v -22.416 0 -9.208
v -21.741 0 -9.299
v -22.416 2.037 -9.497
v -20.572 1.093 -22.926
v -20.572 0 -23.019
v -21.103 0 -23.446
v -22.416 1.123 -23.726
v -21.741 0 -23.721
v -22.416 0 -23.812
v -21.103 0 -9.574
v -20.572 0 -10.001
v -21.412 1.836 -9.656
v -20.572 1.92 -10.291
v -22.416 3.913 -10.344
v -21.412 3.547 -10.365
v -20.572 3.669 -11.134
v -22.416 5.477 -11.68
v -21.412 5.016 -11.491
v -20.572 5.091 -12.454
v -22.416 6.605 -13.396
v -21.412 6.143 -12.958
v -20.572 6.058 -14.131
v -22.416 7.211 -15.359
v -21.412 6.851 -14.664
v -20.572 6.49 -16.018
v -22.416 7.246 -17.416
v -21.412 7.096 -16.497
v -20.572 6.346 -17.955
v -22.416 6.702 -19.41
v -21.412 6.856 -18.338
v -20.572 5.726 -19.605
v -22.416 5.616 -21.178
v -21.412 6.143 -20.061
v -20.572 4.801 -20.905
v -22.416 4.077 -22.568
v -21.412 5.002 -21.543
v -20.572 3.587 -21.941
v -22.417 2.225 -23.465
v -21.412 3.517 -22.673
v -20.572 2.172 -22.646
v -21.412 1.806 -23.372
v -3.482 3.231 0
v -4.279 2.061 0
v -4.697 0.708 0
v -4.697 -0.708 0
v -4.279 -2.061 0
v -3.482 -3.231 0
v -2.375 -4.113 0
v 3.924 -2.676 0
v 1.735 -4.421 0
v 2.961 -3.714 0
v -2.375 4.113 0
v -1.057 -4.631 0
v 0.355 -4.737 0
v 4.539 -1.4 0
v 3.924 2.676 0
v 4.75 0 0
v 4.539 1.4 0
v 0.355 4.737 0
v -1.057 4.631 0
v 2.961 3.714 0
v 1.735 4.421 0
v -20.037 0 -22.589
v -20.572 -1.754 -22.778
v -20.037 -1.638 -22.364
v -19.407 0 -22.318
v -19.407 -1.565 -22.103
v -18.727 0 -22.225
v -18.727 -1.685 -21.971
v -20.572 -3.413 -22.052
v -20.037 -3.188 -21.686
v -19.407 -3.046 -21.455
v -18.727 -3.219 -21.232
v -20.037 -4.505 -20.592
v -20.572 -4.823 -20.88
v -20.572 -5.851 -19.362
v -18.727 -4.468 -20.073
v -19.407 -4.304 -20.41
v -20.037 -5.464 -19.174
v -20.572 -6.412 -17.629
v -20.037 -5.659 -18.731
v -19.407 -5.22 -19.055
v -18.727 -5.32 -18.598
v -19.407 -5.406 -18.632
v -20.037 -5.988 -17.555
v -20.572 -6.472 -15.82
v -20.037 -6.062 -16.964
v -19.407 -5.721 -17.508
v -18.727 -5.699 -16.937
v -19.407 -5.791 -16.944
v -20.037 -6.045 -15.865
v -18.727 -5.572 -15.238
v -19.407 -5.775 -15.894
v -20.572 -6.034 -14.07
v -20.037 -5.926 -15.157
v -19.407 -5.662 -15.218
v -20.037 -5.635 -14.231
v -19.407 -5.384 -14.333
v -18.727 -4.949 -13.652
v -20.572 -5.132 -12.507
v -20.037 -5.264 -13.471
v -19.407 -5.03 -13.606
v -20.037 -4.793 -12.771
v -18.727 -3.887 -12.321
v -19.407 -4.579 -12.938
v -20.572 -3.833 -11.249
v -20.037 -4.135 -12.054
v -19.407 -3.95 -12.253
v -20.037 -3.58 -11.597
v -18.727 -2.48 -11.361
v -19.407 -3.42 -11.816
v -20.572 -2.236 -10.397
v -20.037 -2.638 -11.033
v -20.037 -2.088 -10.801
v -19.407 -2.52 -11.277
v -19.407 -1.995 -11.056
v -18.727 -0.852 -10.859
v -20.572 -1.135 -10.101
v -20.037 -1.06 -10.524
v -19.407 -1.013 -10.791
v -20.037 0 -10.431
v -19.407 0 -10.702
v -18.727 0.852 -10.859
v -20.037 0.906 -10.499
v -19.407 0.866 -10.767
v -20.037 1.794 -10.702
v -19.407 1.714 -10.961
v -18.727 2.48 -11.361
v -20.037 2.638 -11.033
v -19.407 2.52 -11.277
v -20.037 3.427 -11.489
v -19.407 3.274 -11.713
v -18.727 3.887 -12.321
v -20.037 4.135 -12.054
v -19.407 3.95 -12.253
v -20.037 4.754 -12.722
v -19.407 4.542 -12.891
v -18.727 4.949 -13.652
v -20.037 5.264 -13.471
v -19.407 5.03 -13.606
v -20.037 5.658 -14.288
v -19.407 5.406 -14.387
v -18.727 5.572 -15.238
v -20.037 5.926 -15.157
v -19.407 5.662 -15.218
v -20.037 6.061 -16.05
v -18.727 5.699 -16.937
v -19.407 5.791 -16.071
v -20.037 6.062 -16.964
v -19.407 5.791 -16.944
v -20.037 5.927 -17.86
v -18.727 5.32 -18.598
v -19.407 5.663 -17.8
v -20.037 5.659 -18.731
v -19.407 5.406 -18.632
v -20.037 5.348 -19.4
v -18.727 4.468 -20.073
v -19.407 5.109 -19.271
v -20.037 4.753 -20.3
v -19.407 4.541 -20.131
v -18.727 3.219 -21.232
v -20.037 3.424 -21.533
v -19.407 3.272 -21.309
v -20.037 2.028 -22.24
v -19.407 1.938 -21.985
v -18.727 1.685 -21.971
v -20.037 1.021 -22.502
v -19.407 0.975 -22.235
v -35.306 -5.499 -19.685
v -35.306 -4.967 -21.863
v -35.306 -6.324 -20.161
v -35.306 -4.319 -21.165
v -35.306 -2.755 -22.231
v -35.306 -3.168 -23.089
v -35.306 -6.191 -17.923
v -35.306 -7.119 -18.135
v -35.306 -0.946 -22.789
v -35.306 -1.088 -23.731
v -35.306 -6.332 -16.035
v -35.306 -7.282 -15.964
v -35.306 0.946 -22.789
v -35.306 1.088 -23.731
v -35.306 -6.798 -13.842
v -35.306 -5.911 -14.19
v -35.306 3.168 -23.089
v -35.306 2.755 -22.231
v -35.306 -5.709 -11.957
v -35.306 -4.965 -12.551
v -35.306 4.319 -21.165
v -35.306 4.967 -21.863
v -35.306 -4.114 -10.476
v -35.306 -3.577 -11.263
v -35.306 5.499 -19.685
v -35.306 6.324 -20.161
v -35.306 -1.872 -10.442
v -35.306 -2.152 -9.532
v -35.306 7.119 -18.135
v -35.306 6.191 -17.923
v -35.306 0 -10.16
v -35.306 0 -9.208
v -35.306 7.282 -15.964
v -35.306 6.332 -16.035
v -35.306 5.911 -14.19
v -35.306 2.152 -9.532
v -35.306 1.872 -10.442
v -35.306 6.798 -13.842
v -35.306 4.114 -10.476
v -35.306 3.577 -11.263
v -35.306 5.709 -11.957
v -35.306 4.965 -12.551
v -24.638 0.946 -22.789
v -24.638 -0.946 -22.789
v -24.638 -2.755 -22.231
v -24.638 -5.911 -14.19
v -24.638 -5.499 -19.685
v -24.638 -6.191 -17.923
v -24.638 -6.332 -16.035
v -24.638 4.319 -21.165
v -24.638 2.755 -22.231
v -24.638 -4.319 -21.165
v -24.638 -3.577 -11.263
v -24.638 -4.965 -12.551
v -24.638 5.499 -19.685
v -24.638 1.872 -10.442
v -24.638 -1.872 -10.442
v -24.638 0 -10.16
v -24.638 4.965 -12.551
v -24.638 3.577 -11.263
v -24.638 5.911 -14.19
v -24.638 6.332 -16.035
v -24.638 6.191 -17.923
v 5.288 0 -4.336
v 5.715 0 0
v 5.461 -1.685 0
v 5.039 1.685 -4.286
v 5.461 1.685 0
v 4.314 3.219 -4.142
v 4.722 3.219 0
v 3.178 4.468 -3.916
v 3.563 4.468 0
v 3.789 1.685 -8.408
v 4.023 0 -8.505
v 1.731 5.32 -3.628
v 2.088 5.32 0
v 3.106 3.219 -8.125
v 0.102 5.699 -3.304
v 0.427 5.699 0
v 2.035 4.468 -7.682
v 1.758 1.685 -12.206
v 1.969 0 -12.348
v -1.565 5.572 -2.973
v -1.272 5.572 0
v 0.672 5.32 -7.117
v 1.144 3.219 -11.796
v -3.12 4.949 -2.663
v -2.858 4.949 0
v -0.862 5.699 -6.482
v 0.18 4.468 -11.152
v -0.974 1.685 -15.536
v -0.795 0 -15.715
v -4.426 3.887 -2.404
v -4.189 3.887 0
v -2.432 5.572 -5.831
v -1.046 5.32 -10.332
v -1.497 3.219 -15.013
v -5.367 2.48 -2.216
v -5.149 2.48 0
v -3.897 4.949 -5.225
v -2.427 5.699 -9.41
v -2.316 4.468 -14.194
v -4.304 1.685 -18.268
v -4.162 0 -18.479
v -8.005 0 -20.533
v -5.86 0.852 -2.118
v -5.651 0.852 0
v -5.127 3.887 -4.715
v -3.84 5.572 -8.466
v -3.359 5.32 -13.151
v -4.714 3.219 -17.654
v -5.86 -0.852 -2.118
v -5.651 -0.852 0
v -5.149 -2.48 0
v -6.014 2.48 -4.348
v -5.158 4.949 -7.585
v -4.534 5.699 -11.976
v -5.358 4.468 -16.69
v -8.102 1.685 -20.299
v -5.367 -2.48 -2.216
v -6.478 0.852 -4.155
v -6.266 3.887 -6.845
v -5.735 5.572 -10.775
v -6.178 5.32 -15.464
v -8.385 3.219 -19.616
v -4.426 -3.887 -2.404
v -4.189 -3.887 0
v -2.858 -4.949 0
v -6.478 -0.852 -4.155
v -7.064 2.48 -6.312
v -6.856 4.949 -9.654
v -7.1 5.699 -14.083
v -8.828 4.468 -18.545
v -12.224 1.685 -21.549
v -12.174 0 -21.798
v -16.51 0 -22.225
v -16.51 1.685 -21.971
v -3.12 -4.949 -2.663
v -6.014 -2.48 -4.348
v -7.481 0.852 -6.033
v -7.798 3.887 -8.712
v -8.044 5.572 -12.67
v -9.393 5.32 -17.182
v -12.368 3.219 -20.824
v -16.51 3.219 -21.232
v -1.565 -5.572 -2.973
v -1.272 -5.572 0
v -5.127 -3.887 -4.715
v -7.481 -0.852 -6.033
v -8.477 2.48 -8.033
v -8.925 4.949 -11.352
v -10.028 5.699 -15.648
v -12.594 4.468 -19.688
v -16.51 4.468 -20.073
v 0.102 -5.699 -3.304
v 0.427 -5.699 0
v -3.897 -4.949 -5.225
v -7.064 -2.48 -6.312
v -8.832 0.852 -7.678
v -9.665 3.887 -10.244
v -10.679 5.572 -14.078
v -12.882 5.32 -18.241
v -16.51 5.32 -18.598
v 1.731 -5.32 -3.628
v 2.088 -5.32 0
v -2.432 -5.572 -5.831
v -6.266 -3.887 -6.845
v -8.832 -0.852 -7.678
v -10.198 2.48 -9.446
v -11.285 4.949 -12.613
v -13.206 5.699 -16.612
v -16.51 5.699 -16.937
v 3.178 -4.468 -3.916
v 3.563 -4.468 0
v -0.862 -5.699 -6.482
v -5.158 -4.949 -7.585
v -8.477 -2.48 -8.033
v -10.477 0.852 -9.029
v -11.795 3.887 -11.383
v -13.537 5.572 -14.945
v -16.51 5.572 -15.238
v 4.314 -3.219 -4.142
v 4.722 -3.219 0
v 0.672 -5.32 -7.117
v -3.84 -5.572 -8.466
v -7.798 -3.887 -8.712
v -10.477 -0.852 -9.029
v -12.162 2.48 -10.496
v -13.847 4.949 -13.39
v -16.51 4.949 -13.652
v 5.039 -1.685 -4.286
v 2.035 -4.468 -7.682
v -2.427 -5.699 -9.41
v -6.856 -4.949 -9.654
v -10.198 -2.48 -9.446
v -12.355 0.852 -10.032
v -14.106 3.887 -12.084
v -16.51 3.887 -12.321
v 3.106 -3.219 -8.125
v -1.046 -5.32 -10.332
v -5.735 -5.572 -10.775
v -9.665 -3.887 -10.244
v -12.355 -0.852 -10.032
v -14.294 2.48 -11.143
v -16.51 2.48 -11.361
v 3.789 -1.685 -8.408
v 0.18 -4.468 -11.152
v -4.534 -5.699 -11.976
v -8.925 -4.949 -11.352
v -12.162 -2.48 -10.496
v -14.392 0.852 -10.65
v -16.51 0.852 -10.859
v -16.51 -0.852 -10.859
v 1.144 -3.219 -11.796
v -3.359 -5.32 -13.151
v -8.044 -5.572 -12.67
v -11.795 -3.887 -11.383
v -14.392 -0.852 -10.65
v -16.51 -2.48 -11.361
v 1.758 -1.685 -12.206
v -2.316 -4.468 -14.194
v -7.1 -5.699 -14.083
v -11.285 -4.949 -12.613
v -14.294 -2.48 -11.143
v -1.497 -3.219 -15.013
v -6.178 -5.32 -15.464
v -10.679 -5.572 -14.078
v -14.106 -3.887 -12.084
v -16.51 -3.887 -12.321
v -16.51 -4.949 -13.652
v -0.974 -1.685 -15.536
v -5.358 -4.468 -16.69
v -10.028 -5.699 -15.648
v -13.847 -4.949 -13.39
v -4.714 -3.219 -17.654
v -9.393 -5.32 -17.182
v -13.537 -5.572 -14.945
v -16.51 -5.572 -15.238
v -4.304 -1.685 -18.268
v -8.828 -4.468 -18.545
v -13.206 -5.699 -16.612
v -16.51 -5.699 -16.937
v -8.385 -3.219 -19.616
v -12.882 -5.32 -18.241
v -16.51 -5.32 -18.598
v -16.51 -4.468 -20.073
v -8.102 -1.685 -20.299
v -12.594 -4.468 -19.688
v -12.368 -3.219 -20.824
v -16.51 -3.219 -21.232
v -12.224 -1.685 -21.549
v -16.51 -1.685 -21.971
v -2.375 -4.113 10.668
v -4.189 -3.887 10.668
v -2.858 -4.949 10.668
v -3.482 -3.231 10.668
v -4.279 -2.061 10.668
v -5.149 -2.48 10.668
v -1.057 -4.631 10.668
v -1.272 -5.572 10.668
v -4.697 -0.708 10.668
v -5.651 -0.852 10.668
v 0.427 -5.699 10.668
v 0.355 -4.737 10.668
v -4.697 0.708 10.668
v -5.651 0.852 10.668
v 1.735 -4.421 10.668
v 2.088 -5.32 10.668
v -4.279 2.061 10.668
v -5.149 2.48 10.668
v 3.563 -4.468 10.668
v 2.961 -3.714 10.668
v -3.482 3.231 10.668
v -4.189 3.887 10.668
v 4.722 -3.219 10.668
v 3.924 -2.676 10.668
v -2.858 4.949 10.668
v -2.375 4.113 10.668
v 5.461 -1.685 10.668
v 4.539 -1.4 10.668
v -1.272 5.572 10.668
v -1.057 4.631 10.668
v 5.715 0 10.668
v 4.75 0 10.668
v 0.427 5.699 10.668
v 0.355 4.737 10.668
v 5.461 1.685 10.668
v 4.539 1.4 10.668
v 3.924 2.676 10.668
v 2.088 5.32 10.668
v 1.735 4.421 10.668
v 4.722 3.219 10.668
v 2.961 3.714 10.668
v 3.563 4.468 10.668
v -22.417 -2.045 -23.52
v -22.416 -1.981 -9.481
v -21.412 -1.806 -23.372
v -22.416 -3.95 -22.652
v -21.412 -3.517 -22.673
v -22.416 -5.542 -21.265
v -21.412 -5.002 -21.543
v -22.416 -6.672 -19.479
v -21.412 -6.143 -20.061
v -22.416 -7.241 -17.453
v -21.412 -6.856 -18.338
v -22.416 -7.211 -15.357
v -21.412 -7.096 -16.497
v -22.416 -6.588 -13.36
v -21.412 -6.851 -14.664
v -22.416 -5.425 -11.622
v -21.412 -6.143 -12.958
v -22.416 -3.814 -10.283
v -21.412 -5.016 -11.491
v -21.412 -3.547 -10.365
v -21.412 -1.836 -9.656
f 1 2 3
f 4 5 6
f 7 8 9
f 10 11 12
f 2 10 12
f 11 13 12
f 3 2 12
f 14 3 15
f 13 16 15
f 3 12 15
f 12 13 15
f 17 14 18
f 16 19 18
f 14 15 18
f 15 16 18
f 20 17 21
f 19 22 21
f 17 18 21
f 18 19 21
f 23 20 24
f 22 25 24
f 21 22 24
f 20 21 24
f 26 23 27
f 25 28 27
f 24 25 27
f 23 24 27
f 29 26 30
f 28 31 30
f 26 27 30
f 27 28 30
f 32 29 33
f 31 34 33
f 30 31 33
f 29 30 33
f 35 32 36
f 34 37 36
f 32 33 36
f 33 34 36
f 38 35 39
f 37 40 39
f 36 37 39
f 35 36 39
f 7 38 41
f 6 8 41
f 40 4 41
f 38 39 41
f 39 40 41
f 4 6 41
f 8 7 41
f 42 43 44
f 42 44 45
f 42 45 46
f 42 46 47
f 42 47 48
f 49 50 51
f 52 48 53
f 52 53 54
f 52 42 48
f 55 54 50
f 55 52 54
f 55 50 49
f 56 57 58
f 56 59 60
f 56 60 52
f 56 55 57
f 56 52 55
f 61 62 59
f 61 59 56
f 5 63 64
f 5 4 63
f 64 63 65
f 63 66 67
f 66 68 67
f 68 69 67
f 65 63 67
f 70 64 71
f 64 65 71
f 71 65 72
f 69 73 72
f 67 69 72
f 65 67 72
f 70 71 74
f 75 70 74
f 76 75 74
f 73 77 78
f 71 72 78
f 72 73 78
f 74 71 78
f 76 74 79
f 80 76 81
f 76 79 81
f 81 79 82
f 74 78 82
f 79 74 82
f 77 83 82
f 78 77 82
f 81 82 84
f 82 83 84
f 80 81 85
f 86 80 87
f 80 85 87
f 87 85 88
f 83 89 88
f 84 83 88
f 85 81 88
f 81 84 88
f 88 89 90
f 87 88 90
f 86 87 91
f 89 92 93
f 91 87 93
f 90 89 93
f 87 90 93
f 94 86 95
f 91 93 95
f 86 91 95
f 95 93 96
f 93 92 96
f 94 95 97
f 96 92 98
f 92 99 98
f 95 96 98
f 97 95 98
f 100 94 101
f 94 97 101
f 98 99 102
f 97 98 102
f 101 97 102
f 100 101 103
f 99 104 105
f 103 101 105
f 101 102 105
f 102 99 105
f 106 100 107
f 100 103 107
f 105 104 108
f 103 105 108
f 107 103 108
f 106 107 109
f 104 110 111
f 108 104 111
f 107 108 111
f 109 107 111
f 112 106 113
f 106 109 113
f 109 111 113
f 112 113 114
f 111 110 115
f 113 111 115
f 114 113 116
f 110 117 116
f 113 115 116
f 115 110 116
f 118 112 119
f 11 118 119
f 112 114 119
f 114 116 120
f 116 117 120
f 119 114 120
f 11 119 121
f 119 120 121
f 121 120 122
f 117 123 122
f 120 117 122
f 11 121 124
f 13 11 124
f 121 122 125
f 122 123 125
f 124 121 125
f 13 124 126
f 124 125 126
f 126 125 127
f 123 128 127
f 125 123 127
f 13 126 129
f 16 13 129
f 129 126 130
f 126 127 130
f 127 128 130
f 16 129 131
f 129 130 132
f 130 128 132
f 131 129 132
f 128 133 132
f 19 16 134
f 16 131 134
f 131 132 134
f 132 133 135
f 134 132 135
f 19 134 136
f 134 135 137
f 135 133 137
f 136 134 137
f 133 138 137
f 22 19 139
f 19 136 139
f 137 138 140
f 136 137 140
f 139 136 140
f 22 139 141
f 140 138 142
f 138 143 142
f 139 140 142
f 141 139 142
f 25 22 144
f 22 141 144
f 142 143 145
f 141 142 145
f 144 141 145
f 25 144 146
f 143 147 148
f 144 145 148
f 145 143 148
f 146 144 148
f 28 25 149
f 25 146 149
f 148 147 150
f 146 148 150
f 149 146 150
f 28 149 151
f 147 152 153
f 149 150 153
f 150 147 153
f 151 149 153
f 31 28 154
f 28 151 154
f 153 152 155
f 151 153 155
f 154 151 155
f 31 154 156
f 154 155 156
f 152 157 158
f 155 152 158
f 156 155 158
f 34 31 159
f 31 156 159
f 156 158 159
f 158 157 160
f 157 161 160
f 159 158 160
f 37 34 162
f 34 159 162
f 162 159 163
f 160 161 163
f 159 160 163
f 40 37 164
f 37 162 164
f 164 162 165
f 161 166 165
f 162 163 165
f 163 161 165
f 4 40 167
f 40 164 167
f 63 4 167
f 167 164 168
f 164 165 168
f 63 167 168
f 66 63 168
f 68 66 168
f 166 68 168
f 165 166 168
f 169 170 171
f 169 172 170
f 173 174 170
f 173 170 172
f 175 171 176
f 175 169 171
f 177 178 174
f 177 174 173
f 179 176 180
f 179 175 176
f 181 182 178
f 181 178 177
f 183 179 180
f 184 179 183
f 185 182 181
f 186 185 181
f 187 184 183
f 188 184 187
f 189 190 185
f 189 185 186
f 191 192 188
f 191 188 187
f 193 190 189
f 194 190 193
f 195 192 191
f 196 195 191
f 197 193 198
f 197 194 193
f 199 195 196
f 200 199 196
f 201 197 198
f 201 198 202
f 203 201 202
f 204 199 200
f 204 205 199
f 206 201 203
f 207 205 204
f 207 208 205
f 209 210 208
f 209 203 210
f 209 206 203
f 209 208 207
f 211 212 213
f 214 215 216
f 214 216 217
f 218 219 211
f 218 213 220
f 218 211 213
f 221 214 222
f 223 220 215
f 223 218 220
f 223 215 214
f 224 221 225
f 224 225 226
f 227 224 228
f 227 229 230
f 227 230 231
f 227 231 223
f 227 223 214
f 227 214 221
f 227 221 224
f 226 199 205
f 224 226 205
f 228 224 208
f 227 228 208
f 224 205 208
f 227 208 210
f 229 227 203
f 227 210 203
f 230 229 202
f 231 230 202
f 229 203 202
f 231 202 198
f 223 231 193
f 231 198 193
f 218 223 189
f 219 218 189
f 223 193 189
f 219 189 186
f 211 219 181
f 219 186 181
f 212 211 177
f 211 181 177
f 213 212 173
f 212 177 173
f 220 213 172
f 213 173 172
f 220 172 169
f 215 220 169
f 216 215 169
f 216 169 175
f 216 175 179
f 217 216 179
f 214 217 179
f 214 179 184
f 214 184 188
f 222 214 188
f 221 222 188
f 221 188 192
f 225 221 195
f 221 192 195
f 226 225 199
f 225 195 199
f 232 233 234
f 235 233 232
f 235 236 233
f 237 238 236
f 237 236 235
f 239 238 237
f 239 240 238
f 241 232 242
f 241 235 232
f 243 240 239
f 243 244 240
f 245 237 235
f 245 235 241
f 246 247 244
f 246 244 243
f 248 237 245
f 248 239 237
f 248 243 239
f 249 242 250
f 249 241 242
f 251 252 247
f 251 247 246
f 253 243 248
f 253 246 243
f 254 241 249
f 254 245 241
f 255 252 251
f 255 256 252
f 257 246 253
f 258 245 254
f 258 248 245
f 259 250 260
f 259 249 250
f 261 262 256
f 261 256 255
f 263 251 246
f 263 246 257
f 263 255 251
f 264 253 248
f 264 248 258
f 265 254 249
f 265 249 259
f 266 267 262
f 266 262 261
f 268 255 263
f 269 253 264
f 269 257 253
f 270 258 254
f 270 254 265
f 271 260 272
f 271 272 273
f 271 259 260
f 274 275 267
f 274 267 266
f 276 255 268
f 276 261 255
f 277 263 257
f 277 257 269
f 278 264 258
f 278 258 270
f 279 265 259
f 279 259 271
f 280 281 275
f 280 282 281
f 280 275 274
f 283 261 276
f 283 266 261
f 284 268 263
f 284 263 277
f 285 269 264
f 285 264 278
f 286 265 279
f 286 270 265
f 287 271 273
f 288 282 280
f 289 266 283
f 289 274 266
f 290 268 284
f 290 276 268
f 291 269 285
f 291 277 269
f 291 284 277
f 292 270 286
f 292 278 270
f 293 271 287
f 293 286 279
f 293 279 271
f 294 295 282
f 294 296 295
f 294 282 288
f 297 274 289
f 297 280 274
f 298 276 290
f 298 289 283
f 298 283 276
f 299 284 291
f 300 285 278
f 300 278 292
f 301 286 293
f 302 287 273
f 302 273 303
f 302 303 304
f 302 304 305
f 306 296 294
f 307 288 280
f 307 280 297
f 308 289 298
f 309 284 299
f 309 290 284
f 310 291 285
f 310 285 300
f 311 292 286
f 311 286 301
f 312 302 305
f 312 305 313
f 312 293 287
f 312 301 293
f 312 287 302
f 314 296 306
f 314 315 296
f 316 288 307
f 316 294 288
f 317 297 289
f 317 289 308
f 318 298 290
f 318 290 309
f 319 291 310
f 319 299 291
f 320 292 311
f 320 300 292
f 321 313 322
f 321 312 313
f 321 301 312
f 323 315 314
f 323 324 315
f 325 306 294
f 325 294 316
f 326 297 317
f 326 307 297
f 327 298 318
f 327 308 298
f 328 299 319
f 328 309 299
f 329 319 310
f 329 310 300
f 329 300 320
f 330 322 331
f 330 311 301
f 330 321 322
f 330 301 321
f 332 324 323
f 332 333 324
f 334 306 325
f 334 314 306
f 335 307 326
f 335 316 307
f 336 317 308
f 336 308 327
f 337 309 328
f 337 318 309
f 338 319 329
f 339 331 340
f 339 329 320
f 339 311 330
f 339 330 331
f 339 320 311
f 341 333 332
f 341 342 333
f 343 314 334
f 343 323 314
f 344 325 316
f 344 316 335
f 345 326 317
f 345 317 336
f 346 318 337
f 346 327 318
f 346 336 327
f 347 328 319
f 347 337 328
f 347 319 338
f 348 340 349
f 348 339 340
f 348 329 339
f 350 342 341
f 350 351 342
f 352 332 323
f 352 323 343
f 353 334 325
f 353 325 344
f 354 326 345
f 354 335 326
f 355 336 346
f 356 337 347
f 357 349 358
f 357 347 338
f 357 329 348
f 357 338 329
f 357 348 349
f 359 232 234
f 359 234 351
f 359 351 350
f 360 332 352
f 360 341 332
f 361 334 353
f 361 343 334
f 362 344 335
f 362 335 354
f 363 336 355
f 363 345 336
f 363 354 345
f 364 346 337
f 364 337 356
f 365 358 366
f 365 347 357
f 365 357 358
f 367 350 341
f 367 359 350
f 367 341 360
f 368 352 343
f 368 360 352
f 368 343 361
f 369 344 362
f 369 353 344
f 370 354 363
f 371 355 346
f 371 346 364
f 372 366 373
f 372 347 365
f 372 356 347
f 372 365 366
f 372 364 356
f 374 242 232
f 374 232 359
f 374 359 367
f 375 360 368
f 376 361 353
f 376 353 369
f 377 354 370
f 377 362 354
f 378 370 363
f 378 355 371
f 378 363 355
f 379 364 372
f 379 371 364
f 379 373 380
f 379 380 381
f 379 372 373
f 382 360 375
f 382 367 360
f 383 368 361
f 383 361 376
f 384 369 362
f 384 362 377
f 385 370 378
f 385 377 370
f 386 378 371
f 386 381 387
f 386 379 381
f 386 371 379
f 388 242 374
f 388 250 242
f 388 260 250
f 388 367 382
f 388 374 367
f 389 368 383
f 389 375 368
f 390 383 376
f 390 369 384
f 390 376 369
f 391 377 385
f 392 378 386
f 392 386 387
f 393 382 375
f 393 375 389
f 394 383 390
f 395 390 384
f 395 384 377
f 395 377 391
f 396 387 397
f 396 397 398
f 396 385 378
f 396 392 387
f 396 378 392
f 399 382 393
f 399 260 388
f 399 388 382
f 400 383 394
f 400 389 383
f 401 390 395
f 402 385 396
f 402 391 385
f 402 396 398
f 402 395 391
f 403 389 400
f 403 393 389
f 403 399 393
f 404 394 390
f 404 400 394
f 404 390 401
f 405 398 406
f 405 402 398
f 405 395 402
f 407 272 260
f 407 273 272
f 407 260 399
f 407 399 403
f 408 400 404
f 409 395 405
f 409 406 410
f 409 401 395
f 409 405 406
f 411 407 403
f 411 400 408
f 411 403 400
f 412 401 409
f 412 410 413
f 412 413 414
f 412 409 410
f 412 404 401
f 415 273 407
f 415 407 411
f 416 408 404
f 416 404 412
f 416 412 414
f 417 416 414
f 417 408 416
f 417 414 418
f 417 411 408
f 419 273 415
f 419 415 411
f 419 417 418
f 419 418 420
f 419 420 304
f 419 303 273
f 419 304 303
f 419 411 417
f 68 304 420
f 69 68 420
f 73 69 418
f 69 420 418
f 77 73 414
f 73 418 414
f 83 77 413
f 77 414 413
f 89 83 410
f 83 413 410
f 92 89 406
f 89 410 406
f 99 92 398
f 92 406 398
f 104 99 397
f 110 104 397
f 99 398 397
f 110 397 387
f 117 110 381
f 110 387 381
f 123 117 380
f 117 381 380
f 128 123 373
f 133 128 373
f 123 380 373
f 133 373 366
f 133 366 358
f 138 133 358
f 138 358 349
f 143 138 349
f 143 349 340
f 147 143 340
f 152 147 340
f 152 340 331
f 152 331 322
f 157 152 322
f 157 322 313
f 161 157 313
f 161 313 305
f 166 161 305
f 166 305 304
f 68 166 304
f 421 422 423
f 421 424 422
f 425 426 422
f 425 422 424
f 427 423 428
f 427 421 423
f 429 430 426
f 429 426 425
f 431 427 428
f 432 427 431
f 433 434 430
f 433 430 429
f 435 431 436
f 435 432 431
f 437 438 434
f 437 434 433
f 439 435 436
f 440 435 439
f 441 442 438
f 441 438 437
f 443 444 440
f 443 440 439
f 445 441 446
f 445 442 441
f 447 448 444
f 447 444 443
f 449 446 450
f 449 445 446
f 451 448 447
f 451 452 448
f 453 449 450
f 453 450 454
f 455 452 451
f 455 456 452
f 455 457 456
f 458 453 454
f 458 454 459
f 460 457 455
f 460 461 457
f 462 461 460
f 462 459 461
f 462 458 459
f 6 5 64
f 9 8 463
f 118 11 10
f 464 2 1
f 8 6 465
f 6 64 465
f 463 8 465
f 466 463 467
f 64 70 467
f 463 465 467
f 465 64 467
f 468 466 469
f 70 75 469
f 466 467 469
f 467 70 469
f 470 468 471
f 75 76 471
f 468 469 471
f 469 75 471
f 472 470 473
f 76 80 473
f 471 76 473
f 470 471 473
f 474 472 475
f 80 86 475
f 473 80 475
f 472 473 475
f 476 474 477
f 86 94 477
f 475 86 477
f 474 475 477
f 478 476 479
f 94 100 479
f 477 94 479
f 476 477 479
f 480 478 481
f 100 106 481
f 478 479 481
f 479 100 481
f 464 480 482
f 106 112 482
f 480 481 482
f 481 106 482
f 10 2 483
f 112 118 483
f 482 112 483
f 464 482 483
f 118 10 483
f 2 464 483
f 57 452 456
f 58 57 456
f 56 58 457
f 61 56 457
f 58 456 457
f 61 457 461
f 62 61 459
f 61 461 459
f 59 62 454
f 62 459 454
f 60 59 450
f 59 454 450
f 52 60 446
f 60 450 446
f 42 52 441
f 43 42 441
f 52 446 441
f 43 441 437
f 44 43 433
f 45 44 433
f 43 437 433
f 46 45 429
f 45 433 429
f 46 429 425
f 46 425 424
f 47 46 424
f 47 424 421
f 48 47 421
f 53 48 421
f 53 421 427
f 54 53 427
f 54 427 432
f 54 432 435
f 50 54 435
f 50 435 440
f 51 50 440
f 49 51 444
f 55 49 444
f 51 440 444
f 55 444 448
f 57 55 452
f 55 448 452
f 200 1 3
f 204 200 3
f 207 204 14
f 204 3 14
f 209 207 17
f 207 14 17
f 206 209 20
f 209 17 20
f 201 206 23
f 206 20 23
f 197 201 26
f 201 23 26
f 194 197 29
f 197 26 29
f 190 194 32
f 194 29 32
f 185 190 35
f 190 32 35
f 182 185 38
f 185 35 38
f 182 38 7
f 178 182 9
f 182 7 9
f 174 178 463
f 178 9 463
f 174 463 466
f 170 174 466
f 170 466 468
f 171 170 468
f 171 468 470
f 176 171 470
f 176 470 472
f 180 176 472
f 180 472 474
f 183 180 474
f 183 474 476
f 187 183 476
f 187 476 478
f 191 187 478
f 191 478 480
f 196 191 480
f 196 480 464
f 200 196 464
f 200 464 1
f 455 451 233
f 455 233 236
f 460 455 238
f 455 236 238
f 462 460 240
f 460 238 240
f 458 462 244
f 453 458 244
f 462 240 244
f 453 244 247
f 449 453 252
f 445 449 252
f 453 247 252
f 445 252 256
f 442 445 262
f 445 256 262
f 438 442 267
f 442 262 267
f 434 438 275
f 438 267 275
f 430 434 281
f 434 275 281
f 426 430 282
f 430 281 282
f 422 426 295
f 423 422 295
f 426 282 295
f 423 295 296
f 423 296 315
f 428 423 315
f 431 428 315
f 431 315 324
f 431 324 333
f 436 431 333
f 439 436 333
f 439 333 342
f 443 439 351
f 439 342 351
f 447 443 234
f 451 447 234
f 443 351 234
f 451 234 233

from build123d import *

# Parameters (mm, degrees)
SKETCH3_R           = 5.715
BOSS_EXTRUDE1_DEPTH = 10.668
SWEEP1_OUTLINE_R    = 5.715
SWEEP1_ANGLE        = 90
SKETCH9_R           = 5.715
BOSS_EXTRUDE2_DEPTH = 4.572
SKETCH11_R          = 7.3025
BOSS_EXTRUDE3_DEPTH = 14.224
FILLET1_R           = 2.54
FILLET2_R           = 2.54
SKETCH12_R          = 4.7498
CUT_EXTRUDE1_DEPTH  = 10.668
SKETCH13_R          = 6.35
CUT_EXTRUDE2_DEPTH  = 10.668


# Read off the part's stored shape, not the designer's step: Sweep1
with BuildPart() as part:
    # Sketch3 → Boss-Extrude1 (new body)
    with BuildSketch(Plane.XY):
        Circle(SKETCH3_R)
    extrude(amount=BOSS_EXTRUDE1_DEPTH)

    # Sweep1 outline → Sweep1 (revolve)
    with BuildSketch(Plane(origin=(-16.51, 0, 0), x_dir=(1, 0, 0), z_dir=(0, 0, 1))):
        with Locations((16.51, 0)):
            Circle(SWEEP1_OUTLINE_R)
    revolve(axis=Axis((-16.51, 0, 0), (0, 1, 0)), revolution_arc=SWEEP1_ANGLE)

    # Sketch9 → Boss-Extrude2 (add)
    with BuildSketch(Plane.ZY.offset(16.51)):
        with Locations(Location((-16.51, 0, 0), (0, 0, 180))):
            Circle(SKETCH9_R)
    extrude(amount=BOSS_EXTRUDE2_DEPTH)

    # Sketch11 → Boss-Extrude3 (add)
    with BuildSketch(Plane.ZY.offset(21.082)):
        with Locations((-16.51, 0)):
            Circle(SKETCH11_R)
    extrude(amount=BOSS_EXTRUDE3_DEPTH)

    # Fillet1
    # the kernel refuses this fillet: 2.54 mm, written as the material it adds along each edge
    with BuildSketch(Plane(origin=(-21.082, 0, -16.51), x_dir=(0, 0, -1), z_dir=(0, 1, 0))) as fillet1_piece_1:
        with BuildLine():
            CenterArc((8.255, -2.35464302), FILLET1_R, 112.024312837, 67.975687163)
            Line((5.715, -2.35464302), (5.6642, -2.35464302))
            Line((5.6642, -2.35464302), (5.6642, 0))
            Line((5.6642, 0), (5.715, 0.0508))
            ThreePointArc((5.715, 0.0508), (6.50875, 0.0508), (7.28345, 0.04709286))
            Line((7.28345, 0.04709286), (7.3025, 0))
        make_face()
    revolve(axis=Axis((-21.082, 0, -16.51), (-1, 0, 0)))

    # Fillet2
    fillet2_edges = [part.edges().sort_by_distance(p)[0] for p in [
        (-21.082, 7.3025, -16.51),
    ]]
    fillet(fillet2_edges, radius=FILLET2_R)

    # Sketch12 → Cut-Extrude1 (cut)
    with BuildSketch(Plane.XY.offset(10.668)):
        Circle(SKETCH12_R)
    extrude(amount=-CUT_EXTRUDE1_DEPTH, mode=Mode.SUBTRACT)

    # Sketch13 → Cut-Extrude2 (cut)
    with BuildSketch(Plane.ZY.offset(35.306)):
        with Locations((-16.51, 0)):
            Circle(SKETCH13_R)
    extrude(amount=-CUT_EXTRUDE2_DEPTH, mode=Mode.SUBTRACT)


solid = part.part
